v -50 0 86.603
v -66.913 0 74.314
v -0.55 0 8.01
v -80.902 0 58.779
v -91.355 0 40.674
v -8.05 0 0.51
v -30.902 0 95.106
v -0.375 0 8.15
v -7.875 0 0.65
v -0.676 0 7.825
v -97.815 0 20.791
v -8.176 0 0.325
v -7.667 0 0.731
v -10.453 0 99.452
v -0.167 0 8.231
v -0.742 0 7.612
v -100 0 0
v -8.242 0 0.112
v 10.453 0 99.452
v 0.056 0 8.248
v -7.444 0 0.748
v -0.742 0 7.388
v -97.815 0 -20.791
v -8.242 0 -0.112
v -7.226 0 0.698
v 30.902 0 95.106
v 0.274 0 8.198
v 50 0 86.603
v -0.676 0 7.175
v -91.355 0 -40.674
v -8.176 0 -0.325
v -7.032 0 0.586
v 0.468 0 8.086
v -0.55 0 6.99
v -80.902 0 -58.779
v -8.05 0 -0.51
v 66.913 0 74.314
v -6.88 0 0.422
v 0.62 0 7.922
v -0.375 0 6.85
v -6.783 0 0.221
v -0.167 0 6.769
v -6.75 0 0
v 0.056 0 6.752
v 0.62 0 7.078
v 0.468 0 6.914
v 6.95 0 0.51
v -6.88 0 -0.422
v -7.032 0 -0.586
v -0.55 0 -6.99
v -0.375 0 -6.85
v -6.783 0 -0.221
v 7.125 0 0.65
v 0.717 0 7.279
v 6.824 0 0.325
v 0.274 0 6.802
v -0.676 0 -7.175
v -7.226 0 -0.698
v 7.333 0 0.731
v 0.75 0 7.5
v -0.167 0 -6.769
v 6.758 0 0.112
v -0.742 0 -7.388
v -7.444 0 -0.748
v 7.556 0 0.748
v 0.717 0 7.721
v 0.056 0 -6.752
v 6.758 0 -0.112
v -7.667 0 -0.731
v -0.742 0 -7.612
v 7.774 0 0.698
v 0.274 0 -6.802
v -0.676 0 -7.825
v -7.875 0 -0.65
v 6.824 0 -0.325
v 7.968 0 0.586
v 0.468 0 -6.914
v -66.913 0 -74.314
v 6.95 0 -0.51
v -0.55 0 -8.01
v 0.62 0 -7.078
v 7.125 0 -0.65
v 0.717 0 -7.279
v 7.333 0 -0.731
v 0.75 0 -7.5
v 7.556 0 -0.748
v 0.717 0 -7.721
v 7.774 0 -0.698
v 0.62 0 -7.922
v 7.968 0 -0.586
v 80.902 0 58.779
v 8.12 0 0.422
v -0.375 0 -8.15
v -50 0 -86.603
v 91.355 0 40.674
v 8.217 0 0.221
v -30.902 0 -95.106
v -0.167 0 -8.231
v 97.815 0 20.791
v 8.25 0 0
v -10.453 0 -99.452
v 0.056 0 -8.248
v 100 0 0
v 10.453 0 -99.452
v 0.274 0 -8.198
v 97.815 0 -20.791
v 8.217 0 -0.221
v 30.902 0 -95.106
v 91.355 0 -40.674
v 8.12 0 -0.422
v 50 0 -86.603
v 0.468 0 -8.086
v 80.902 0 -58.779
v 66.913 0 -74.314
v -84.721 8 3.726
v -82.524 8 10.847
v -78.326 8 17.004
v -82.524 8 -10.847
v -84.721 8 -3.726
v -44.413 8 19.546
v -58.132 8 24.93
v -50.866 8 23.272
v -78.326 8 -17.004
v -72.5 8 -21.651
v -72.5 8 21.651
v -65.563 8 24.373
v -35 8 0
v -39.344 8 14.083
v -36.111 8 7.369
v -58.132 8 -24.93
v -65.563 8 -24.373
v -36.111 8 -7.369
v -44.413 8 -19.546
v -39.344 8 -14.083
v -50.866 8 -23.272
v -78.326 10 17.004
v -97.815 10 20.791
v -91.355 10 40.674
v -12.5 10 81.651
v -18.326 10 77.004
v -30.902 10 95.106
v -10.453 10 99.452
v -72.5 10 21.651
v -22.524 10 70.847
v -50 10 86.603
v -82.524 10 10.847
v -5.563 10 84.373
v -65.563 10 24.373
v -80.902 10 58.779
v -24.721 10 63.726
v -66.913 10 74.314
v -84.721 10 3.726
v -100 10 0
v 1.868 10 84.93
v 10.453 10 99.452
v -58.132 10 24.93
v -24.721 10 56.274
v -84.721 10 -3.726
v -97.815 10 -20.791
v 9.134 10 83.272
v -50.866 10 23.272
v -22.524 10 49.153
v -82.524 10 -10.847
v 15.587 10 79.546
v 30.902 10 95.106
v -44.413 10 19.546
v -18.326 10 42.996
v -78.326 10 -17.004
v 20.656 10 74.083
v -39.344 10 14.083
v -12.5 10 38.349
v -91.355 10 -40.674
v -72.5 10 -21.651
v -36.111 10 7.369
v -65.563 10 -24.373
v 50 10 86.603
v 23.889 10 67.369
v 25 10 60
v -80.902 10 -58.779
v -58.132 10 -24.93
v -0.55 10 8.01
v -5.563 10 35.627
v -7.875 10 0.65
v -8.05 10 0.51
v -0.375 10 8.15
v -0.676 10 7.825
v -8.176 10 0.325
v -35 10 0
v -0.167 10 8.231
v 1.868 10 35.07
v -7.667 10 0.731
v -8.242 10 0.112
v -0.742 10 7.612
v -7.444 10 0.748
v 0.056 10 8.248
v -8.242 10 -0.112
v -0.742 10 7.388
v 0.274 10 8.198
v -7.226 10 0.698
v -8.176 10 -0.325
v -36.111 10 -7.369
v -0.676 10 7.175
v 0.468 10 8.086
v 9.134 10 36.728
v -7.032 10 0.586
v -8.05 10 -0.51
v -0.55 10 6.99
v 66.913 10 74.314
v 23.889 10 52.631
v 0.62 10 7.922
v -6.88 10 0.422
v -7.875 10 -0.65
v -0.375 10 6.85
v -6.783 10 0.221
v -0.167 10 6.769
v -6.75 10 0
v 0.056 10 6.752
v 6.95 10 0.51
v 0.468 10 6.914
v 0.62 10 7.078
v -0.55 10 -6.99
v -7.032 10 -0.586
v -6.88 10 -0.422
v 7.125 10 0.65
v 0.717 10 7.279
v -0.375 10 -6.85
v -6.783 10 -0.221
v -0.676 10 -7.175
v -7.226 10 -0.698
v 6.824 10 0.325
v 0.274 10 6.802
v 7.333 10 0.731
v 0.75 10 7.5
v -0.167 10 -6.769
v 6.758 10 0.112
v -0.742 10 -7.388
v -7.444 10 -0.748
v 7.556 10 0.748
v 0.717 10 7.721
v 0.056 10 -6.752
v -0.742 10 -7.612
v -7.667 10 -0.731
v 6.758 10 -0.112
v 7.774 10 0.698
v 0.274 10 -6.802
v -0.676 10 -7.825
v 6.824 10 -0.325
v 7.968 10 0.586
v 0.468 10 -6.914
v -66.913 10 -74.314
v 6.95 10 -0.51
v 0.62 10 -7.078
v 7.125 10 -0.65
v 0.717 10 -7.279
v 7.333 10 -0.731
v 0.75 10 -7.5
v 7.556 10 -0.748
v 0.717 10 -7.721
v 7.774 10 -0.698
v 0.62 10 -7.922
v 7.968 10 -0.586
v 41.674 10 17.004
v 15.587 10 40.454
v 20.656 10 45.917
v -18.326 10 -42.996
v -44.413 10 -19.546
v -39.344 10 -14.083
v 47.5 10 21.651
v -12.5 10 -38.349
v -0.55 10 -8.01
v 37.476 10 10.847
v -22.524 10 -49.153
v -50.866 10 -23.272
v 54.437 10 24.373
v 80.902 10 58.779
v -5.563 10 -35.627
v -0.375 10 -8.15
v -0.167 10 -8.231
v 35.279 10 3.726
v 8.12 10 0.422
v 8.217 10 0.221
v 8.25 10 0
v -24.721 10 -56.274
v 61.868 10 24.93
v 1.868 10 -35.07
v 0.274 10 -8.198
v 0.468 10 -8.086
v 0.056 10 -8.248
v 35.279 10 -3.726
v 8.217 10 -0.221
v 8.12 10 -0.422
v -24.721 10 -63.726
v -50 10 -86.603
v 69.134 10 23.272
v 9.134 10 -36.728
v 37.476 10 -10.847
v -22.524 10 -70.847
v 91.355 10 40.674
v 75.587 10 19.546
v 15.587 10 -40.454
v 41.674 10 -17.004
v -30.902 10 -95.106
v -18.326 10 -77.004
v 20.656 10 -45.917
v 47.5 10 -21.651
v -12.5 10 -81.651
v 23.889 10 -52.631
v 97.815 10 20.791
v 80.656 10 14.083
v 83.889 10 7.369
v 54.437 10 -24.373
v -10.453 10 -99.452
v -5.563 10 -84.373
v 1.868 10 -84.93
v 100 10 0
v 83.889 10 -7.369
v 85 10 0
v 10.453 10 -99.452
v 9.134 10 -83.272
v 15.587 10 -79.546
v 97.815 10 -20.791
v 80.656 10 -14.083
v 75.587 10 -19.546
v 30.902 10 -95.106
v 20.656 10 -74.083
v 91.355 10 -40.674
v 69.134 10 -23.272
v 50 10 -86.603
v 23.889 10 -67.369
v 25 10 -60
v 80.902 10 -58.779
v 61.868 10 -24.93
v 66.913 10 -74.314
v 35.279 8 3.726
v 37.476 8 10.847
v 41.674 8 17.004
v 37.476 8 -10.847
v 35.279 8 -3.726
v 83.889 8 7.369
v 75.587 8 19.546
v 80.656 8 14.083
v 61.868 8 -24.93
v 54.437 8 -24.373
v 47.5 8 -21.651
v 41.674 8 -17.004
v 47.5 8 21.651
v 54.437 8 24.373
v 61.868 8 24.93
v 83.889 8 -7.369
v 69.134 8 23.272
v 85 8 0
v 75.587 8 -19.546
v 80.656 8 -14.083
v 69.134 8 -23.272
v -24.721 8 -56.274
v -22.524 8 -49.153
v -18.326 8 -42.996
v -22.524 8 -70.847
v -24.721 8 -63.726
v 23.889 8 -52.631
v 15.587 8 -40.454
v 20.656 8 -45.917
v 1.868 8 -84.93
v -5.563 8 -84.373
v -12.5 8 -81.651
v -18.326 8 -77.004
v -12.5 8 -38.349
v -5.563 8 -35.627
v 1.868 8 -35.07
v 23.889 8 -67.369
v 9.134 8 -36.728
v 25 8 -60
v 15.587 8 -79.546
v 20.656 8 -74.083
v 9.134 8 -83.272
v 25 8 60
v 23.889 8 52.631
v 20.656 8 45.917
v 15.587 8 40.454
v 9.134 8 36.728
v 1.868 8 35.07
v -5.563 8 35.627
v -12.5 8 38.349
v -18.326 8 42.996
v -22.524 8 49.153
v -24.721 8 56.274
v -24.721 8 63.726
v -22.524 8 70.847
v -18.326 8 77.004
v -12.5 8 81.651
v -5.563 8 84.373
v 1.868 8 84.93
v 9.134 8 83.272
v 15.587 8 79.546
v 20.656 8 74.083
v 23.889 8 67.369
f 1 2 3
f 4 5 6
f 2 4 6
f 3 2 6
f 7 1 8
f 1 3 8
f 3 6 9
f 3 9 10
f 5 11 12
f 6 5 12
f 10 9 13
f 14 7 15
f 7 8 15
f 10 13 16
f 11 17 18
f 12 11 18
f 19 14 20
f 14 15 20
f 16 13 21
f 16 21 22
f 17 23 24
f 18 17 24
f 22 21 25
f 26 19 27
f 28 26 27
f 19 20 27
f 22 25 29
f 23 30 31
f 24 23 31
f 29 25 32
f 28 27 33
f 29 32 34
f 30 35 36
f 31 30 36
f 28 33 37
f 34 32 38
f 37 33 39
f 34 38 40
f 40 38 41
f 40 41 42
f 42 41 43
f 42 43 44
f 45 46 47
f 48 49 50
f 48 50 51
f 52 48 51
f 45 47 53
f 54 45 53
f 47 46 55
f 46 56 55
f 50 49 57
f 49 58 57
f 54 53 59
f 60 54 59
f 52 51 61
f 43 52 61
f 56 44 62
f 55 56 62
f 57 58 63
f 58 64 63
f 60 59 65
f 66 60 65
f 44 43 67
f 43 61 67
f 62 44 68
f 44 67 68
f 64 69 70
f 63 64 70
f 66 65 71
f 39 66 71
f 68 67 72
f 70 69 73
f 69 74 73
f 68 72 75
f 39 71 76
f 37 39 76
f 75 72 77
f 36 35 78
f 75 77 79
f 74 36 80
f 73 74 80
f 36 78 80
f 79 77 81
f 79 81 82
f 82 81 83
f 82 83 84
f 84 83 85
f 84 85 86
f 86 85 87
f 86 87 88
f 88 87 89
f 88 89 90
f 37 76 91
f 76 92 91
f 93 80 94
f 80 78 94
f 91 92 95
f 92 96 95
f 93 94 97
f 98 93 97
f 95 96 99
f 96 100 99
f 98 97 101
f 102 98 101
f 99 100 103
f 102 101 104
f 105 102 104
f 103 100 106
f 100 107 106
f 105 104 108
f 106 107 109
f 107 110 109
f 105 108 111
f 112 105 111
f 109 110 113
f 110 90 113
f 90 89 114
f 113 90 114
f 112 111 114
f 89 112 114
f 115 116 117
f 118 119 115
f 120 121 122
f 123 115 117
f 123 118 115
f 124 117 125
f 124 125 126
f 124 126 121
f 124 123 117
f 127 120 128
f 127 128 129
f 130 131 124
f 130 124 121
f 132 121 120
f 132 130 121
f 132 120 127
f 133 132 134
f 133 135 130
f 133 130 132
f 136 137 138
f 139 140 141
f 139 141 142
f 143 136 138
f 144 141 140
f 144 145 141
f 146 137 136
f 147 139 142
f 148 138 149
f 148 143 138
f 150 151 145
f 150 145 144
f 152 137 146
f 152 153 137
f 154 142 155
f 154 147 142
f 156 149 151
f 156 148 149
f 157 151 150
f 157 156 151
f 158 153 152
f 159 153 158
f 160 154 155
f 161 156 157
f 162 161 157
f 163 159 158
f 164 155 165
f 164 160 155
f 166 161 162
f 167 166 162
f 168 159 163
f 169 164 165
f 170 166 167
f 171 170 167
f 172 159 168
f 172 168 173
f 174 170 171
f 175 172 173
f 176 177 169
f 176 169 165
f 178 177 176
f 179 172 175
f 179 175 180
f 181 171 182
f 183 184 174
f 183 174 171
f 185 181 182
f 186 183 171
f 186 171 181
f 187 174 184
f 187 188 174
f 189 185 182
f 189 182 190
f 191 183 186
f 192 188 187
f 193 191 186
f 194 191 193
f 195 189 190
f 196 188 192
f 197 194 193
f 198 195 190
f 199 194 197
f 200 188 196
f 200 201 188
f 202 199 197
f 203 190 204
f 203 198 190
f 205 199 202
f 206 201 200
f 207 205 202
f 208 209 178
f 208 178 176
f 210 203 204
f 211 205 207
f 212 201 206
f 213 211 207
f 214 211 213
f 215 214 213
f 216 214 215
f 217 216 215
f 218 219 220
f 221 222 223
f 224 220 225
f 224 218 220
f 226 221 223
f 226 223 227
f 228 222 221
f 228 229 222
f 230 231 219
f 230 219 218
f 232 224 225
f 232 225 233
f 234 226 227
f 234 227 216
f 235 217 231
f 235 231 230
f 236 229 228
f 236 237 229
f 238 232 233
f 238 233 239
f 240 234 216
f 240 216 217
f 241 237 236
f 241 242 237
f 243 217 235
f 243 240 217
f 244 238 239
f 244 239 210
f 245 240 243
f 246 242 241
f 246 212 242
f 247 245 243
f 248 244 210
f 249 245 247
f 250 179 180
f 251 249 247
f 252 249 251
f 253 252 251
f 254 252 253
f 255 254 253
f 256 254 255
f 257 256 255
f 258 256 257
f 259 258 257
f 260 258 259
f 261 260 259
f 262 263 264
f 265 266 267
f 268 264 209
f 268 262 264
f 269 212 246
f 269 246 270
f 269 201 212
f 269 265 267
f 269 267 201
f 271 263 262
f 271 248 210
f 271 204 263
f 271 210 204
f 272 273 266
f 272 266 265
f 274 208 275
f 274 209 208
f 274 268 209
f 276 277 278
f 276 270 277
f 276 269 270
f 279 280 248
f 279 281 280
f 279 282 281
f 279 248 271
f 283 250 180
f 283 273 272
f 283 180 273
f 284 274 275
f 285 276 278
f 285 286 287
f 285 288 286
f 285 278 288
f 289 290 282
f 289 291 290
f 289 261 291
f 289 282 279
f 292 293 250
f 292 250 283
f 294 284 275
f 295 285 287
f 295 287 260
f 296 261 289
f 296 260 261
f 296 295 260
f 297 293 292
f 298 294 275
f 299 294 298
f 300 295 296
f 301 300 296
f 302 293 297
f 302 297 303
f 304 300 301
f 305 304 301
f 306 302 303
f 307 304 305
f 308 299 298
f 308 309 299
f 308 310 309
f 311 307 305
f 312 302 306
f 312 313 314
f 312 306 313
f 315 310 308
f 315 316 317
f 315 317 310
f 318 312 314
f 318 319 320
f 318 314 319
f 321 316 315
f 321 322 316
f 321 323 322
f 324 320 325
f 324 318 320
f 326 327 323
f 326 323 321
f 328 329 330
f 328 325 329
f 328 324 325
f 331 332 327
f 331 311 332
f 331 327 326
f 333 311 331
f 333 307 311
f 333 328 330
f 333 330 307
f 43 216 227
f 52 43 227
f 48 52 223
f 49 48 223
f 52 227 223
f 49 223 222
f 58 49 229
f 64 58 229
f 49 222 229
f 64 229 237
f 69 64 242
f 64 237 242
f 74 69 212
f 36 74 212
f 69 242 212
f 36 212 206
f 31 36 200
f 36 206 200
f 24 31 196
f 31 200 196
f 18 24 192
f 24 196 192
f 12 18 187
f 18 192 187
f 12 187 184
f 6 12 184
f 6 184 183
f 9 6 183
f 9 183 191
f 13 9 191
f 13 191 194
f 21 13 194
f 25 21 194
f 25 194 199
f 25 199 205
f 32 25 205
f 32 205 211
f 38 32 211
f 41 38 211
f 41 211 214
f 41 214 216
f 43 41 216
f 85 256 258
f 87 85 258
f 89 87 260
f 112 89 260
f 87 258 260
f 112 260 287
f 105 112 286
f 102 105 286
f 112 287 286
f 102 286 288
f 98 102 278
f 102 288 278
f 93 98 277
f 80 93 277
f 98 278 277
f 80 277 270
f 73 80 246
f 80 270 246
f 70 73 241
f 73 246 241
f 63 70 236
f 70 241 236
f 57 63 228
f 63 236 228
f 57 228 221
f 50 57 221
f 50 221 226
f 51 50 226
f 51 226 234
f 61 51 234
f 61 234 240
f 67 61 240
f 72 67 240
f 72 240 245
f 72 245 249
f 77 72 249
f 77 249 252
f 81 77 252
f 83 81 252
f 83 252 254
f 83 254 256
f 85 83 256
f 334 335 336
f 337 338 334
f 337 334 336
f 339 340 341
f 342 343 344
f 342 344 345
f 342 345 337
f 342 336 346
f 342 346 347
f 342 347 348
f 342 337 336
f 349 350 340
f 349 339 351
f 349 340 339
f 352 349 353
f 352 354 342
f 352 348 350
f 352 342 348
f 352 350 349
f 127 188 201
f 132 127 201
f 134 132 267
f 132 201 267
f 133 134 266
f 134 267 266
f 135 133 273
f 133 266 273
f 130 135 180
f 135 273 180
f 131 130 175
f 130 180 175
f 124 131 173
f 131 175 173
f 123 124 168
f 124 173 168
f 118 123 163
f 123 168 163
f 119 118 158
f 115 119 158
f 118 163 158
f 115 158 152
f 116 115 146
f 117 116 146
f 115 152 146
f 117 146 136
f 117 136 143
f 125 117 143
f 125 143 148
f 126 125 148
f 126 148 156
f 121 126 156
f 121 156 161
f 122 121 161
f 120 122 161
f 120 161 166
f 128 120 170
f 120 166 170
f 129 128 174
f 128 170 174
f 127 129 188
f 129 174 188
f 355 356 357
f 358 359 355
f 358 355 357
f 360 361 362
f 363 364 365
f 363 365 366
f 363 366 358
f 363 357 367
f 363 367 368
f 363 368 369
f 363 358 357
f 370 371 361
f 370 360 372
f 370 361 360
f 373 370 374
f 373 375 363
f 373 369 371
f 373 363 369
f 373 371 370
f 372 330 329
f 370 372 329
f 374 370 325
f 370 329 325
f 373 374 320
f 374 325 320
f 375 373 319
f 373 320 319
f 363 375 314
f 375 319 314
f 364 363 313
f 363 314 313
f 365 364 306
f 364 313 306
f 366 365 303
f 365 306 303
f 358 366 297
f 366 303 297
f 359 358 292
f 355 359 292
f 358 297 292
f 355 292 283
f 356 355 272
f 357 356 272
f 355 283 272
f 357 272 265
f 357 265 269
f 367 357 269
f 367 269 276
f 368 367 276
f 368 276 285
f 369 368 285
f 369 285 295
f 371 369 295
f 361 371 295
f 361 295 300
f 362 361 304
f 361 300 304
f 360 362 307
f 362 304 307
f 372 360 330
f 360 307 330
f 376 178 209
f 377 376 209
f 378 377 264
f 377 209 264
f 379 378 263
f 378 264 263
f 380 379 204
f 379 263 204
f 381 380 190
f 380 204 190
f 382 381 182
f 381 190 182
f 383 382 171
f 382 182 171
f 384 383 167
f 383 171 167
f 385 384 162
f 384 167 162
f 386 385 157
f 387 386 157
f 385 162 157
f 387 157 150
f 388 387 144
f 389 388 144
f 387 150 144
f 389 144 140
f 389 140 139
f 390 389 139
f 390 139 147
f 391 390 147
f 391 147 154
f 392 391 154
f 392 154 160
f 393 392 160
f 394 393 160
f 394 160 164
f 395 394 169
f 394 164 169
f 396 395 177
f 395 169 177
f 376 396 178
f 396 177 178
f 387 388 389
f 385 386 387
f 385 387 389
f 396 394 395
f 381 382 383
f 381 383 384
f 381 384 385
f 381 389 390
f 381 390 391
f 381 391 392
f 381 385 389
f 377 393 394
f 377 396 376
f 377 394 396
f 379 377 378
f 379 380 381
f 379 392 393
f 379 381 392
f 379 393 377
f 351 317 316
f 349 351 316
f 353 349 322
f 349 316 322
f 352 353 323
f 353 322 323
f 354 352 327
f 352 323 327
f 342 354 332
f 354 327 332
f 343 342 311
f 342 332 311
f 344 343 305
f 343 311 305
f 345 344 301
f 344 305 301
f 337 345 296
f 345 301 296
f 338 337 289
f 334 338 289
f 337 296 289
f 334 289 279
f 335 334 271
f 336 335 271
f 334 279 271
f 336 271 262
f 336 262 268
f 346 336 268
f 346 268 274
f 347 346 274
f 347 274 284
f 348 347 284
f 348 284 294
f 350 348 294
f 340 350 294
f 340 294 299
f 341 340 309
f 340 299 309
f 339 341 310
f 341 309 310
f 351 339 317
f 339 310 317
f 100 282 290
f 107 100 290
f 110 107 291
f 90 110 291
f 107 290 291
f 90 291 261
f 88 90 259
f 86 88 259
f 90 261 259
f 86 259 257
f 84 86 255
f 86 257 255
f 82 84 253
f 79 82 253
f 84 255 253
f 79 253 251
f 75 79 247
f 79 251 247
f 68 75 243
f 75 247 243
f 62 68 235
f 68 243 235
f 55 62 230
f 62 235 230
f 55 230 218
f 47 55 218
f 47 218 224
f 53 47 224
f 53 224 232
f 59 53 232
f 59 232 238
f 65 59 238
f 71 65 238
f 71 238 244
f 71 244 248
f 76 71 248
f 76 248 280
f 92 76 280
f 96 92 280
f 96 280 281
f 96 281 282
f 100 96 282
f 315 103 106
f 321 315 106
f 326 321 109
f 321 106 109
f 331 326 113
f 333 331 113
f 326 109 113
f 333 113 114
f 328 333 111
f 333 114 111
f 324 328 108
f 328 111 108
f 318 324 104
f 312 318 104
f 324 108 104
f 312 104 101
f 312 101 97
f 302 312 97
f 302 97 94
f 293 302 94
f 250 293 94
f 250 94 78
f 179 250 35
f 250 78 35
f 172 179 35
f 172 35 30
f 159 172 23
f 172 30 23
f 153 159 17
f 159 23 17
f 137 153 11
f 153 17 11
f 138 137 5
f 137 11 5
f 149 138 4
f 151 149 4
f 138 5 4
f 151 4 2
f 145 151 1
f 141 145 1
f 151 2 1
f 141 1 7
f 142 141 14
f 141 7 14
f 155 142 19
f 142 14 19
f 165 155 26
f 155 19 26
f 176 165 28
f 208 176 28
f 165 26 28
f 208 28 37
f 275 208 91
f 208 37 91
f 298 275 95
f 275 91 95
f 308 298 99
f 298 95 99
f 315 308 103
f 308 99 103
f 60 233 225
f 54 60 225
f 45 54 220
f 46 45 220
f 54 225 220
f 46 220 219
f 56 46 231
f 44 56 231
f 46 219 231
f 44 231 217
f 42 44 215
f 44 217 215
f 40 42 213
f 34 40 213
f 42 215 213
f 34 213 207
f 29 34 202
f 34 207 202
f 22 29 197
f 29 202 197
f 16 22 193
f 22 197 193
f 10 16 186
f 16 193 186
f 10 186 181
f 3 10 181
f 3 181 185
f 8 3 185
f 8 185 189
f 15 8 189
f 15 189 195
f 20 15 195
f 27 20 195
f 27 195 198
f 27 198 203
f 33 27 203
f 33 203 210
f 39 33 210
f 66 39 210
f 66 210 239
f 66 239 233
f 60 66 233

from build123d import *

# Parameters (mm, degrees)
CROQUIS1_R              = 100
SALIENTE_EXTRUIR1_DEPTH = 10
CROQUIS2_R              = 0.75
CORTAR_EXTRUIR1_DEPTH   = 11
CROQUIS3_R              = 25
CORTAR_EXTRUIR2_DEPTH   = 2


with BuildPart() as part:
    # Croquis1 → Saliente-Extruir1 (new body)
    with BuildSketch(Plane(origin=(0, 0, 0), x_dir=(1, 0, 0), z_dir=(0, 1, 0))):
        Circle(CROQUIS1_R)
    extrude(amount=SALIENTE_EXTRUIR1_DEPTH)

    # Croquis2 → Cortar-Extruir1 (cut, through all)
    with BuildSketch(Plane(origin=(0, 10, 0), x_dir=(1, 0, 0), z_dir=(0, 1, 0))):
        with Locations((-7.5, 0)):
            Circle(CROQUIS2_R)
        with Locations((0, -7.5)):
            Circle(CROQUIS2_R)
        with Locations((7.5, 0)):
            Circle(CROQUIS2_R)
        with Locations((0, 7.5)):
            Circle(CROQUIS2_R)
    extrude(amount=-CORTAR_EXTRUIR1_DEPTH, mode=Mode.SUBTRACT)

    # Croquis3 → Cortar-Extruir2 (cut)
    with BuildSketch(Plane(origin=(0, 10, 0), x_dir=(1, 0, 0), z_dir=(0, 1, 0))):
        with Locations((-60, 0)):
            Circle(CROQUIS3_R)
        with Locations((0, 60)):
            Circle(CROQUIS3_R)
        with Locations((60, 0)):
            Circle(CROQUIS3_R)
        with Locations((0, -60)):
            Circle(CROQUIS3_R)
    extrude(amount=-CORTAR_EXTRUIR2_DEPTH, mode=Mode.SUBTRACT)


solid = part.part
